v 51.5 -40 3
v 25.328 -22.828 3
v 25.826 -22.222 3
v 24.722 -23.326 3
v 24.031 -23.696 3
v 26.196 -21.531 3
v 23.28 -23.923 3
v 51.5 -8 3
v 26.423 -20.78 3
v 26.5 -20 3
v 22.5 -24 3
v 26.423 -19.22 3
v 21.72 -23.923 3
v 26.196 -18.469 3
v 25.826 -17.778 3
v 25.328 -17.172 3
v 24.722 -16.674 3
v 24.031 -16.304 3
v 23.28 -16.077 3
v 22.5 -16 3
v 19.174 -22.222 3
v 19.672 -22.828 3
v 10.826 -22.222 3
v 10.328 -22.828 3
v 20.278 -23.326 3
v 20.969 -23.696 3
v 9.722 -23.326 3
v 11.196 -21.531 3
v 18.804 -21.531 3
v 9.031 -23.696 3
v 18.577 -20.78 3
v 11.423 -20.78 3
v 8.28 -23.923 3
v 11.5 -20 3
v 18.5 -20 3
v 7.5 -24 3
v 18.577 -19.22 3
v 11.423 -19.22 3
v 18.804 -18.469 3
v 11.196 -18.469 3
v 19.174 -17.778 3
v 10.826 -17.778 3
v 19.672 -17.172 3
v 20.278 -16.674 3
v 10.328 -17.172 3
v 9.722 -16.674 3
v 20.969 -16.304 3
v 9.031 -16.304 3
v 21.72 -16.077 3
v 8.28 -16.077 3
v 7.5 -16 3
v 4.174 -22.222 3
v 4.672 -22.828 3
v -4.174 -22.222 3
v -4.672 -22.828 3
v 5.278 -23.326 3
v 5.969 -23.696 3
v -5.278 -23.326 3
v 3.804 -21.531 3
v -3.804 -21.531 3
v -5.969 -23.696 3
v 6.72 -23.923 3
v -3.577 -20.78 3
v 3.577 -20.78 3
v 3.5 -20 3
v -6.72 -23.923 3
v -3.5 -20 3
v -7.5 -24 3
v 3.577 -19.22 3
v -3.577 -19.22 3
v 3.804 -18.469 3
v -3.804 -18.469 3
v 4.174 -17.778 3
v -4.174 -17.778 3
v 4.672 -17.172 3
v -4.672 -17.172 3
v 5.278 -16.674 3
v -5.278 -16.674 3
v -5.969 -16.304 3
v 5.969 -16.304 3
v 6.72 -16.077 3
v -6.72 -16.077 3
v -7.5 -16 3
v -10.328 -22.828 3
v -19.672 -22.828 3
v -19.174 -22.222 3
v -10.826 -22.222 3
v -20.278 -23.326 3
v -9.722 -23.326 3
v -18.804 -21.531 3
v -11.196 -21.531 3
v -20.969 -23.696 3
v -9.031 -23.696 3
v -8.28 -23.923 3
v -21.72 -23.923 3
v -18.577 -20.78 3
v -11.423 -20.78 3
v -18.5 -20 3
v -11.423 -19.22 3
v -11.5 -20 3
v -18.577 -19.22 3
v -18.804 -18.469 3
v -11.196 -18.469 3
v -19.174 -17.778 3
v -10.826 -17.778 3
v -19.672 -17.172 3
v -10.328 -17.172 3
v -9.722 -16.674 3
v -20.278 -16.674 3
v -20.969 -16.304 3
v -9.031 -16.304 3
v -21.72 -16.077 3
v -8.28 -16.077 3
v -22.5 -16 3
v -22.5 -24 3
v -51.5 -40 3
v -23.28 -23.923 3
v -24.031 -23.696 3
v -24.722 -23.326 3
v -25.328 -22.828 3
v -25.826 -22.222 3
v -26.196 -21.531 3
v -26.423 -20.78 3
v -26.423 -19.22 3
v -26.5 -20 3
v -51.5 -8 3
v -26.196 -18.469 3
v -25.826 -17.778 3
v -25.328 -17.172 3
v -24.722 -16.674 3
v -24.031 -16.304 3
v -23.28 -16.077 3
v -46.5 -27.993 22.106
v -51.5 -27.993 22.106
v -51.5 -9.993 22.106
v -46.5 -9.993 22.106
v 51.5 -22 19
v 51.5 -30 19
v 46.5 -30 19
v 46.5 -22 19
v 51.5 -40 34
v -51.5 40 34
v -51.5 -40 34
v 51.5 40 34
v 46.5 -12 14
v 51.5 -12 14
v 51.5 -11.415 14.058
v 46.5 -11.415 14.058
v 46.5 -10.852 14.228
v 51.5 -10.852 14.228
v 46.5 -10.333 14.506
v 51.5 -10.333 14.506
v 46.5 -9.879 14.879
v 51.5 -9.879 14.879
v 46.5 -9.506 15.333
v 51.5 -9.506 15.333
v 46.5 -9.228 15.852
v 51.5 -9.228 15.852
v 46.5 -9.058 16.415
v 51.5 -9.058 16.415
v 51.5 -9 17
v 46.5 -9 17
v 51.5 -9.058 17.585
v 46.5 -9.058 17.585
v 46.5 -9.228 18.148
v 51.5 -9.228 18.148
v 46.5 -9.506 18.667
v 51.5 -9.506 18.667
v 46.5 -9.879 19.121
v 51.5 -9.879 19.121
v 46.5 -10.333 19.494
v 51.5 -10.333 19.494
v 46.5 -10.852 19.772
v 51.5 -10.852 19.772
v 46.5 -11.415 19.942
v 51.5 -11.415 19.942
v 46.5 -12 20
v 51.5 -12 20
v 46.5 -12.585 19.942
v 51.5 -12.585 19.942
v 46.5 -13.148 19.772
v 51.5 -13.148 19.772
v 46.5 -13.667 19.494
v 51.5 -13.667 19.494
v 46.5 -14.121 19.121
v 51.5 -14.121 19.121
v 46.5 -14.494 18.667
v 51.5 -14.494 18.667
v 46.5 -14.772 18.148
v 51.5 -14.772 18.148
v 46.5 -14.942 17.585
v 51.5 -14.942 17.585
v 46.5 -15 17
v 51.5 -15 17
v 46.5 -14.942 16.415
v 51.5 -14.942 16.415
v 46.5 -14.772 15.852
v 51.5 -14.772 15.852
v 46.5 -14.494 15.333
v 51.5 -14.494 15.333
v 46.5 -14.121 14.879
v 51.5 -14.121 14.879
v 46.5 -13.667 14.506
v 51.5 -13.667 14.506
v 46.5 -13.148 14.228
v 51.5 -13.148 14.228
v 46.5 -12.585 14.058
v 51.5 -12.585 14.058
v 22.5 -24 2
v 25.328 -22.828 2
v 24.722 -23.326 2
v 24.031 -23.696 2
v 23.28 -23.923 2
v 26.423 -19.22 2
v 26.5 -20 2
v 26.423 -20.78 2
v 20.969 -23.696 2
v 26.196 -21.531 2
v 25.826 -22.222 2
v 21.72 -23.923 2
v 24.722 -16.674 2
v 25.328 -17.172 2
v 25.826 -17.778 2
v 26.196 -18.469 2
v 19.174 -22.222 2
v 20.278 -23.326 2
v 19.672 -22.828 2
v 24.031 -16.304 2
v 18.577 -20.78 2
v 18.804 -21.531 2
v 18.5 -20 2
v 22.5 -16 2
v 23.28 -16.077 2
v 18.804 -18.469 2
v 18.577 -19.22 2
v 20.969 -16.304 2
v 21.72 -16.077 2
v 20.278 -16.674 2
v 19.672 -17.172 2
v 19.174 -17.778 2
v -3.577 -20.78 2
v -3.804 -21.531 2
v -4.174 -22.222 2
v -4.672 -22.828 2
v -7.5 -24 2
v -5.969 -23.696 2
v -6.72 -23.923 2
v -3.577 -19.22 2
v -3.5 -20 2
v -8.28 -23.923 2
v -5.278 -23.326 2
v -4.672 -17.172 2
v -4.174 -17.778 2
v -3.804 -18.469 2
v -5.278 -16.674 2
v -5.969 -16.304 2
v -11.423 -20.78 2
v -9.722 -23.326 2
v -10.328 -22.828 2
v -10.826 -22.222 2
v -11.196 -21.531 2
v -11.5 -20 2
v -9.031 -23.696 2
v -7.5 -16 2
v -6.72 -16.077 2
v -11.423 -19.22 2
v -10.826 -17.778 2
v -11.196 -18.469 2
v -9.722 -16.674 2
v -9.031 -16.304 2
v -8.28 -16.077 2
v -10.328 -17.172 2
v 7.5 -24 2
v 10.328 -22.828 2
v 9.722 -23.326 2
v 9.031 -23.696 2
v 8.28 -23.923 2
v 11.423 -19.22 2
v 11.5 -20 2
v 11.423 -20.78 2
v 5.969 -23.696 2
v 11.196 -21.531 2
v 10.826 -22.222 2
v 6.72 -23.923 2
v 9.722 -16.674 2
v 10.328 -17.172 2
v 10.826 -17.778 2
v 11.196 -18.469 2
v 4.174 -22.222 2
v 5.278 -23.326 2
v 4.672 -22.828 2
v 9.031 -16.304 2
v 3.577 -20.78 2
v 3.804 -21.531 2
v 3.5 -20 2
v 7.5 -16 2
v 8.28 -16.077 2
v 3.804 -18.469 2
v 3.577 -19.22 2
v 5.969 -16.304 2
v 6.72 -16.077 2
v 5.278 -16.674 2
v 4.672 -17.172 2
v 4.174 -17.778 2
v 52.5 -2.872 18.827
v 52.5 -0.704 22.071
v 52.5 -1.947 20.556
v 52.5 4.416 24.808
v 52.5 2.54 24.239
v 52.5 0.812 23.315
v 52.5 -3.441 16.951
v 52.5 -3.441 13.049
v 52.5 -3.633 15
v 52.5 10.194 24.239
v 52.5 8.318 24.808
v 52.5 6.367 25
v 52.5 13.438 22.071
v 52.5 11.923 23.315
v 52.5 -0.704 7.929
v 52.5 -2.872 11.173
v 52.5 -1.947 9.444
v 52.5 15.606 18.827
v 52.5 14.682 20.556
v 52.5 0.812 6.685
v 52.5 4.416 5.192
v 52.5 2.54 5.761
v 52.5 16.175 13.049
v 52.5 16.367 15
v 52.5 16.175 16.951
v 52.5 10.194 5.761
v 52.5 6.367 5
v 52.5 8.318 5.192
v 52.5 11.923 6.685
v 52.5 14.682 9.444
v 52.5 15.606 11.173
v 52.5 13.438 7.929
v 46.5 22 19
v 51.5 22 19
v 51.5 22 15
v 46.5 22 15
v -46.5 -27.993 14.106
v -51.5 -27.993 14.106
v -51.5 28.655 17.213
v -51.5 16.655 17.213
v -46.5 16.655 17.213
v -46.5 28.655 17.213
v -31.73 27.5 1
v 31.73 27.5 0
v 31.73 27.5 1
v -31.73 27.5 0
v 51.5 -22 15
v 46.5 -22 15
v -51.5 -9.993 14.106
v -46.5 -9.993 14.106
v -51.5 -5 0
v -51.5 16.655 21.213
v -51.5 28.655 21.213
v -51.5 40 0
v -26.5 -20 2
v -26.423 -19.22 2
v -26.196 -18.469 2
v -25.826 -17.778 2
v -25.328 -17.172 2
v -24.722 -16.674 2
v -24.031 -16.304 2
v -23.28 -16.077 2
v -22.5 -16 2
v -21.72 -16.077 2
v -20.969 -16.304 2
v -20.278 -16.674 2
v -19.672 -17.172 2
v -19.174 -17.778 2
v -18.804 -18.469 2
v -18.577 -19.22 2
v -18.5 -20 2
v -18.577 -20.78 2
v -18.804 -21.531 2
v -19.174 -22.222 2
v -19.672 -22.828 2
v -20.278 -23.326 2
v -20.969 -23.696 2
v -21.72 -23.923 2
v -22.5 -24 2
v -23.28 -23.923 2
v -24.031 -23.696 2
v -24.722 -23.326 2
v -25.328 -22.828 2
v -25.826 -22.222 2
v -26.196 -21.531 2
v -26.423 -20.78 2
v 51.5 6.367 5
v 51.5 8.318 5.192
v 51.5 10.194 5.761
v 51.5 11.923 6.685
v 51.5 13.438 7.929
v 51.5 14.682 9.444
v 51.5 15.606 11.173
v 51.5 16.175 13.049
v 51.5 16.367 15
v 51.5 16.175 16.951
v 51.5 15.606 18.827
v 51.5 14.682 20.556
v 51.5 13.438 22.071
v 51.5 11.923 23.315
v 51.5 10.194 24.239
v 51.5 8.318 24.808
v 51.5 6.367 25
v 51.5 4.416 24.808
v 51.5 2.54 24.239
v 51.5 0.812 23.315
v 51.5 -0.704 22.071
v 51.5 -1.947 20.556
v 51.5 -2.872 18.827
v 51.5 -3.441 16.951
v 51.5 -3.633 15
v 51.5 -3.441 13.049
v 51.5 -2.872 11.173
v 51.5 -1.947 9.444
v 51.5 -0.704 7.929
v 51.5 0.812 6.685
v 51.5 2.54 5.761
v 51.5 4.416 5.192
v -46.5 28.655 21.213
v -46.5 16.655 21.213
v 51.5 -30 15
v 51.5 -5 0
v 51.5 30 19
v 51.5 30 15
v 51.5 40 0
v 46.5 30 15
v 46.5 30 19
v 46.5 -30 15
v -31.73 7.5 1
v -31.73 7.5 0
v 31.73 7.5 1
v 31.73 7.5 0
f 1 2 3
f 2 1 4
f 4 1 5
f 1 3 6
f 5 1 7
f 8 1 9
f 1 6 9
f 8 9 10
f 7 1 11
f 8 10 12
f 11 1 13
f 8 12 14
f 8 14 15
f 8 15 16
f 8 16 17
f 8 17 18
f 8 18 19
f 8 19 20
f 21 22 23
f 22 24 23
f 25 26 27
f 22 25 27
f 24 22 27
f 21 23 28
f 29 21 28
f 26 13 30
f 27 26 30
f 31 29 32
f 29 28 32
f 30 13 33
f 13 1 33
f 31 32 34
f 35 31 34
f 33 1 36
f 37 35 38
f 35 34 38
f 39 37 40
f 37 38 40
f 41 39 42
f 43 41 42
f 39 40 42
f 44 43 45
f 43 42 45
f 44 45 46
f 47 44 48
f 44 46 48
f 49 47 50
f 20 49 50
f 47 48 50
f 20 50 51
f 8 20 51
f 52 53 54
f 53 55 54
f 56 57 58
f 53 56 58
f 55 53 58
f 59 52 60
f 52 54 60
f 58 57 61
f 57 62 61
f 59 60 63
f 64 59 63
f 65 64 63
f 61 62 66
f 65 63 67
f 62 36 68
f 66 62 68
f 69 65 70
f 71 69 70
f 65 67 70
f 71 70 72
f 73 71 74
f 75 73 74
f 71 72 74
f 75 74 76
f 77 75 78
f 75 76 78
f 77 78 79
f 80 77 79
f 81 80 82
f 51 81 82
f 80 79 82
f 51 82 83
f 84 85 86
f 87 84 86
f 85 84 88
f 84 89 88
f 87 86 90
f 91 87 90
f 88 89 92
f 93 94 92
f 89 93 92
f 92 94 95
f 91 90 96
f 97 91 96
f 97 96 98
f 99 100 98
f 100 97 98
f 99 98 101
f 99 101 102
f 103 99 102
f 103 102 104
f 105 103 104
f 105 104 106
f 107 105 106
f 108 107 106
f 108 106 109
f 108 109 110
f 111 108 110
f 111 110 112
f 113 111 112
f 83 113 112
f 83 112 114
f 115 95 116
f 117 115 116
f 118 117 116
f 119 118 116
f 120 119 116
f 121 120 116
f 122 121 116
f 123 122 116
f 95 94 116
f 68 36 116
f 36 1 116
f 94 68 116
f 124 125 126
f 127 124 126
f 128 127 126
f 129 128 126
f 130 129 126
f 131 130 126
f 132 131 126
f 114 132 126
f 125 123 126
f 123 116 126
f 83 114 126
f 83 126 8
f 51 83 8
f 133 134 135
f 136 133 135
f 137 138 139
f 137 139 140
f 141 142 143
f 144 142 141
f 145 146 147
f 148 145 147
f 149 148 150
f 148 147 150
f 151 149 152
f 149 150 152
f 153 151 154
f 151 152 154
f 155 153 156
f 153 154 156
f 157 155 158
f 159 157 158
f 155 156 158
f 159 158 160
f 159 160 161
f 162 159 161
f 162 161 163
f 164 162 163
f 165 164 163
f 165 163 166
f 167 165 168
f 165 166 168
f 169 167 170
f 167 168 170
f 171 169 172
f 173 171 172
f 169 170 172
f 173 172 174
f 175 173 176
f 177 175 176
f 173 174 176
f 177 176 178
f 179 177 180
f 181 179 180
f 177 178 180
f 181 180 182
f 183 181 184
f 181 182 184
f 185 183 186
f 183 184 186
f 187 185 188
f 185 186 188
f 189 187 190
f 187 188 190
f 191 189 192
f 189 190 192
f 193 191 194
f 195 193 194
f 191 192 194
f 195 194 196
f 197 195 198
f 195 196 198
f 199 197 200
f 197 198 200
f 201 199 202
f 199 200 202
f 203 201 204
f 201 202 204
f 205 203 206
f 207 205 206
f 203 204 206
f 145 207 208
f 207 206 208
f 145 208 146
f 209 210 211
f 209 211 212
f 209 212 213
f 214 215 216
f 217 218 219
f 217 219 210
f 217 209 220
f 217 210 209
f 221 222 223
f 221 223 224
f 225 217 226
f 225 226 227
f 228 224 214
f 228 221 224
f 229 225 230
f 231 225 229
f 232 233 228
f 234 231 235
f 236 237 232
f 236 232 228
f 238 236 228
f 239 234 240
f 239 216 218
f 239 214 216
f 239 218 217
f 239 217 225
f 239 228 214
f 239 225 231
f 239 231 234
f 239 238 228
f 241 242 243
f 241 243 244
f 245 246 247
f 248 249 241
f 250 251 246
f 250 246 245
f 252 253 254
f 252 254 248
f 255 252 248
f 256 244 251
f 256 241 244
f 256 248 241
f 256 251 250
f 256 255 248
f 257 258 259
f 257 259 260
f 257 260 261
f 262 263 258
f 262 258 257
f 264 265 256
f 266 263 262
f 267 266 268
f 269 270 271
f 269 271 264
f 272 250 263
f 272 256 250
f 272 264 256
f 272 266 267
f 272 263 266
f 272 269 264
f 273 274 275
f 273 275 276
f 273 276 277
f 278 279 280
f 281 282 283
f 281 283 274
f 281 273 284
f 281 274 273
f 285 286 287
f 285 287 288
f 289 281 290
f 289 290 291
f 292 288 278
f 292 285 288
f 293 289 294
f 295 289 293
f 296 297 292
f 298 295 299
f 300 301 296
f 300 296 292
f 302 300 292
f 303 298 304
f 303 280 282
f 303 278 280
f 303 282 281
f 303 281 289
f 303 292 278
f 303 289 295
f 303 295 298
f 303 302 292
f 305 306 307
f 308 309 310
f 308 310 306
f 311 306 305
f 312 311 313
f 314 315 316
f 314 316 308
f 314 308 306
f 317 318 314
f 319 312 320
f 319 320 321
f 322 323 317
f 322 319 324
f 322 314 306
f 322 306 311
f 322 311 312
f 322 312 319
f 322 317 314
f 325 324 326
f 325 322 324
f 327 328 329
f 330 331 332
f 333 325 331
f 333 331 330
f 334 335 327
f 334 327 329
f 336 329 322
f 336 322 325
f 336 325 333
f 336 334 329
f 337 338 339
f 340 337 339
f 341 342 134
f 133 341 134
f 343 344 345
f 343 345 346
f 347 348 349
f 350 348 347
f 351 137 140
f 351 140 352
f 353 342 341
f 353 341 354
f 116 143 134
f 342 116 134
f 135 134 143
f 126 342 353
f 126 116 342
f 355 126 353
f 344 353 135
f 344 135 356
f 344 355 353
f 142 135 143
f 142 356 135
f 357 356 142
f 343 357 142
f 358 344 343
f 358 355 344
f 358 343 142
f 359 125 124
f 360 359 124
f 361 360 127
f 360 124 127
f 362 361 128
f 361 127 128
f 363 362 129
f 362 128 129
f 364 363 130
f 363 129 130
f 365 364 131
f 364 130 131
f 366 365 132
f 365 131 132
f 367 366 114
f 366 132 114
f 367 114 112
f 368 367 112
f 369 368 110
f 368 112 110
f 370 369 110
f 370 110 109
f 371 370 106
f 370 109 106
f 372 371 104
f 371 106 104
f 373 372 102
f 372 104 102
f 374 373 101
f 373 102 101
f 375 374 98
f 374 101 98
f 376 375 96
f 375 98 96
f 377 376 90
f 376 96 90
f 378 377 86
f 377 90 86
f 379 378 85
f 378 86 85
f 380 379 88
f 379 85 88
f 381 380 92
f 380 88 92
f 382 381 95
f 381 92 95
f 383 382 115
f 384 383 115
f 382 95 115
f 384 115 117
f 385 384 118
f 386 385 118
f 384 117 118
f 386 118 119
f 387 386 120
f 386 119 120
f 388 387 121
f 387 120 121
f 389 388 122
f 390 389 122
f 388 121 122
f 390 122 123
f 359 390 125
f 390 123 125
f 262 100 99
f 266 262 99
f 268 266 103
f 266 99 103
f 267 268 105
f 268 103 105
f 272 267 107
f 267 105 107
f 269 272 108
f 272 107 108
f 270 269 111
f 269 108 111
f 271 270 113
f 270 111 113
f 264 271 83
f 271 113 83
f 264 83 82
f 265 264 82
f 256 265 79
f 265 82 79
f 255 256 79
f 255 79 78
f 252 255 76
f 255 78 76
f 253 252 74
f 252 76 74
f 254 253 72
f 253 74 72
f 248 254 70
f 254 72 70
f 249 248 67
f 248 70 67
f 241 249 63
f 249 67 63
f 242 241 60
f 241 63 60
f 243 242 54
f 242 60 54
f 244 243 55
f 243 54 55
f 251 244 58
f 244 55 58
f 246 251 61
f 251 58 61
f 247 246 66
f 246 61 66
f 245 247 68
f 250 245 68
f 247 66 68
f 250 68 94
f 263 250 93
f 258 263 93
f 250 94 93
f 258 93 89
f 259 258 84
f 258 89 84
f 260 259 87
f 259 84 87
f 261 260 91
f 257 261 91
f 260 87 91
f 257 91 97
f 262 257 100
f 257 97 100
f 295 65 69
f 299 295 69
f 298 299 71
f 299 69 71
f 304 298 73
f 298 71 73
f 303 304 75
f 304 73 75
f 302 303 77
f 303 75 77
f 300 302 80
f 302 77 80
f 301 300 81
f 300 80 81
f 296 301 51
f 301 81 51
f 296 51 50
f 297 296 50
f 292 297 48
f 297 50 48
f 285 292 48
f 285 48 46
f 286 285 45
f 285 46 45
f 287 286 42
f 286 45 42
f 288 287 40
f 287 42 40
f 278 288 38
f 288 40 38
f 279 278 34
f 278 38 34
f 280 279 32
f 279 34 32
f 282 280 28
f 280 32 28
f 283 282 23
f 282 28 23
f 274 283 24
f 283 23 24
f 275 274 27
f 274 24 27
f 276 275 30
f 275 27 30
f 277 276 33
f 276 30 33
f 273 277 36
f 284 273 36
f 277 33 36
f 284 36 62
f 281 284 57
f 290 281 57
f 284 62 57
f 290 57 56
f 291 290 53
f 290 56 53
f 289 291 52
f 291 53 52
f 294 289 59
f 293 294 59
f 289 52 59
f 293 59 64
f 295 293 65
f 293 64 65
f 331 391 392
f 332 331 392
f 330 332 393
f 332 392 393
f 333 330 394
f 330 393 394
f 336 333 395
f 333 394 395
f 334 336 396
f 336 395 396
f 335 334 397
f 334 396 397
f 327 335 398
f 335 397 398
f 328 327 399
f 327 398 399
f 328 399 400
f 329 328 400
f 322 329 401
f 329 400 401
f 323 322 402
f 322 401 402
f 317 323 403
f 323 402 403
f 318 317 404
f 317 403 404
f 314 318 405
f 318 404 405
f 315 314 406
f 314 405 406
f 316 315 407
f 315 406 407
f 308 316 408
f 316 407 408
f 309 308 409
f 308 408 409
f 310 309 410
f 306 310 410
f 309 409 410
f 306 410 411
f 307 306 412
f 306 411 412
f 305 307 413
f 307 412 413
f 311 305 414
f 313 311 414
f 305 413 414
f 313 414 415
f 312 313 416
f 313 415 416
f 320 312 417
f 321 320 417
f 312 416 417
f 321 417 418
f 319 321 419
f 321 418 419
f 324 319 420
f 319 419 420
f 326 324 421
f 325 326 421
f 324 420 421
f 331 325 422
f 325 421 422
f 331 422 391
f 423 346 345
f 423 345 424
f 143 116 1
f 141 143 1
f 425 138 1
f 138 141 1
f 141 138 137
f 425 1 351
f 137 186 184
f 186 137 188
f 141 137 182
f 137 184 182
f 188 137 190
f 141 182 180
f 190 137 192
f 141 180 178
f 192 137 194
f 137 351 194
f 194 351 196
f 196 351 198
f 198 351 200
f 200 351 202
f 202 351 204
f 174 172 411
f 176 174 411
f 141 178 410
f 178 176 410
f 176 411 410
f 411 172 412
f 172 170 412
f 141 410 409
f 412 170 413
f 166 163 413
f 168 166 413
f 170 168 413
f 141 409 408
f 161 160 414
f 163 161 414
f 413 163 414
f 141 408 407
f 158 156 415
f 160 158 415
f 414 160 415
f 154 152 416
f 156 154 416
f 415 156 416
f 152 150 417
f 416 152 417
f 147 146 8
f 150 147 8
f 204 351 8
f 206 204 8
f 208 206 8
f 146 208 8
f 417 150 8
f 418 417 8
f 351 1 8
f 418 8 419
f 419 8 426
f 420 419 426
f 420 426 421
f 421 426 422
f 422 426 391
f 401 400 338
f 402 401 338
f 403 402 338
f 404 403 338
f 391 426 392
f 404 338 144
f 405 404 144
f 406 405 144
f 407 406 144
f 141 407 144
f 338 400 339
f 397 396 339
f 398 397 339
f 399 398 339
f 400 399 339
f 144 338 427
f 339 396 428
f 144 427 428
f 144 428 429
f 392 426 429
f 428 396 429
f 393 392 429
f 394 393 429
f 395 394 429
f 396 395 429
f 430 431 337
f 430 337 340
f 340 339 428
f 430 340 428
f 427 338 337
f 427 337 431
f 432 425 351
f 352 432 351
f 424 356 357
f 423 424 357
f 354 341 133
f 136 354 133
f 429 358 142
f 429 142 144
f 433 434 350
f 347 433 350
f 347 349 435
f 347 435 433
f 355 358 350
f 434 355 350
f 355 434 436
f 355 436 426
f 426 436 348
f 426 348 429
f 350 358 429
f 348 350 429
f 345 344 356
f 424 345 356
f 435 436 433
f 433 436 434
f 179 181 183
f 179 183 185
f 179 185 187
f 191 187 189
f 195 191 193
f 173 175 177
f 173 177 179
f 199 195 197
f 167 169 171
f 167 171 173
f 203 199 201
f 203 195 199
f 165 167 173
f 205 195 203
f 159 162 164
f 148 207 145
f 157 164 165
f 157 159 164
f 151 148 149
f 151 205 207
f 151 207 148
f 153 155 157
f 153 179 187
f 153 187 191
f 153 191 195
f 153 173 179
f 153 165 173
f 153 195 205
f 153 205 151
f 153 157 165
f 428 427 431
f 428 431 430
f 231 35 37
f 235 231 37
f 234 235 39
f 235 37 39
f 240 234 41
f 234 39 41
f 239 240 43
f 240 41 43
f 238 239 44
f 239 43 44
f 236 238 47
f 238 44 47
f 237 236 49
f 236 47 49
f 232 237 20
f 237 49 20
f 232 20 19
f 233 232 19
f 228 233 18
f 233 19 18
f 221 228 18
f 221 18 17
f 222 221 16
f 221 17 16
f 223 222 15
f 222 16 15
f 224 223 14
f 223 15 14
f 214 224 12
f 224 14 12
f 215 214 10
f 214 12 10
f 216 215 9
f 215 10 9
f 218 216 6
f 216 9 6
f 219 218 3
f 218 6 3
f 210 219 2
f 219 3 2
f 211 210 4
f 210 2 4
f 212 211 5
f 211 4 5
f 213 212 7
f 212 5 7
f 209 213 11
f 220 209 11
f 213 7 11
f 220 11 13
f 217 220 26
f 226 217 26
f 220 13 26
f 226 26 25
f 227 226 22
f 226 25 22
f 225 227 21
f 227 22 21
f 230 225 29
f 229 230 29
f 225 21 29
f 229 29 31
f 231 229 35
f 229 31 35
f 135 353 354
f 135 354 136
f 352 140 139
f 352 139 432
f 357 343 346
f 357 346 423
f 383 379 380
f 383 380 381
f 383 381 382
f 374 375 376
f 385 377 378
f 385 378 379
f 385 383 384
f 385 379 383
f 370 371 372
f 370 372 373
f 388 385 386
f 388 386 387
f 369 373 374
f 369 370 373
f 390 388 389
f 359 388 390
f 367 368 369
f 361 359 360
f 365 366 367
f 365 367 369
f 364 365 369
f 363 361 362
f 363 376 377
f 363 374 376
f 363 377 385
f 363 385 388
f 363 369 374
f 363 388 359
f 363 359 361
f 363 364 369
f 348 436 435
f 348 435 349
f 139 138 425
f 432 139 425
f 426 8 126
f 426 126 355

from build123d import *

# Parameters (mm, degrees)
ESQUISSE1_W             = 103
ESQUISSE1_H             = 80
BOSS_EXTRU_1_DEPTH      = 34
ENL_V_MAT_EXTRU_2_DEPTH = 224
ESQUISSE3_W             = 63.460243042
ESQUISSE3_H             = 20
ENL_V_MAT_EXTRU_3_DEPTH = 1
ESQUISSE4_R             = 4
BOSS_EXTRU_2_DEPTH      = 1
ESQUISSE5_R             = 3
ESQUISSE5_W             = 4
ESQUISSE5_H             = 8
ENL_V_MAT_EXTRU_4_DEPTH = 5
ESQUISSE6_R             = 10
BOSS_EXTRU_3_DEPTH      = 1
ESQUISSE7_W             = 8
ESQUISSE7_H             = 18
ESQUISSE7_W_2           = 4
ESQUISSE7_H_2           = 12
ENL_V_MAT_EXTRU_5_DEPTH = 5


with BuildPart() as part:
    # Esquisse1 → Boss.-Extru.1 (new body)
    with BuildSketch(Plane.XY):
        Rectangle(ESQUISSE1_W, ESQUISSE1_H)
    extrude(amount=BOSS_EXTRU_1_DEPTH)

    # Esquisse2 → Enlèv. mat.-Extru.2 (cut)
    with BuildSketch(Plane.ZY.offset(51.5)):
        Polygon((3, -8), (0, -5), (0, -40), (3, -40), (3, -37), align=None)
    extrude(amount=-ENL_V_MAT_EXTRU_2_DEPTH, mode=Mode.SUBTRACT)

    # Esquisse3 → Enlèv. mat.-Extru.3 (cut)
    with BuildSketch(Plane(origin=(0, 0, 0), x_dir=(-1, 0, 0), z_dir=(0, 0, -1))):
        with Locations((0, 17.5)):
            Rectangle(ESQUISSE3_W, ESQUISSE3_H)
    extrude(amount=-ENL_V_MAT_EXTRU_3_DEPTH, mode=Mode.SUBTRACT)

    # Esquisse4 → Boss.-Extru.2 (add)
    with BuildSketch(Plane(origin=(0, 0, 3), x_dir=(-1, 0, 0), z_dir=(0, 0, -1))):
        with Locations((-7.5, -20)):
            Circle(ESQUISSE4_R)
        with Locations((-22.5, -20)):
            Circle(ESQUISSE4_R)
        with Locations((7.5, -20)):
            Circle(ESQUISSE4_R)
        with Locations((22.5, -20)):
            Circle(ESQUISSE4_R)
    extrude(amount=BOSS_EXTRU_2_DEPTH)

    # Esquisse5 → Enlèv. mat.-Extru.4 (cut)
    with BuildSketch(Plane(origin=(51.5, 0, 0), x_dir=(0, 0, -1), z_dir=(1, 0, 0))):
        with Locations((-17, -12)):
            Circle(ESQUISSE5_R)
        with Locations((-17, 26)):
            Rectangle(ESQUISSE5_W, ESQUISSE5_H)
        with Locations((-17, -26)):
            Rectangle(ESQUISSE5_W, ESQUISSE5_H)
    extrude(amount=-ENL_V_MAT_EXTRU_4_DEPTH, mode=Mode.SUBTRACT)

    # Esquisse6 → Boss.-Extru.3 (add)
    with BuildSketch(Plane(origin=(51.5, 0, 0), x_dir=(0, 0, -1), z_dir=(1, 0, 0))):
        with Locations((-15, 6.367248466)):
            Circle(ESQUISSE6_R)
    extrude(amount=BOSS_EXTRU_3_DEPTH)

    # Esquisse7 → Enlèv. mat.-Extru.5 (cut)
    with BuildSketch(Plane.ZY.offset(51.5)):
        with Locations((18.106114865, -18.992792822)):
            Rectangle(ESQUISSE7_W, ESQUISSE7_H)
        with Locations((19.212725932, 22.654616942)):
            Rectangle(ESQUISSE7_W_2, ESQUISSE7_H_2)
    extrude(amount=-ENL_V_MAT_EXTRU_5_DEPTH, mode=Mode.SUBTRACT)


solid = part.part
